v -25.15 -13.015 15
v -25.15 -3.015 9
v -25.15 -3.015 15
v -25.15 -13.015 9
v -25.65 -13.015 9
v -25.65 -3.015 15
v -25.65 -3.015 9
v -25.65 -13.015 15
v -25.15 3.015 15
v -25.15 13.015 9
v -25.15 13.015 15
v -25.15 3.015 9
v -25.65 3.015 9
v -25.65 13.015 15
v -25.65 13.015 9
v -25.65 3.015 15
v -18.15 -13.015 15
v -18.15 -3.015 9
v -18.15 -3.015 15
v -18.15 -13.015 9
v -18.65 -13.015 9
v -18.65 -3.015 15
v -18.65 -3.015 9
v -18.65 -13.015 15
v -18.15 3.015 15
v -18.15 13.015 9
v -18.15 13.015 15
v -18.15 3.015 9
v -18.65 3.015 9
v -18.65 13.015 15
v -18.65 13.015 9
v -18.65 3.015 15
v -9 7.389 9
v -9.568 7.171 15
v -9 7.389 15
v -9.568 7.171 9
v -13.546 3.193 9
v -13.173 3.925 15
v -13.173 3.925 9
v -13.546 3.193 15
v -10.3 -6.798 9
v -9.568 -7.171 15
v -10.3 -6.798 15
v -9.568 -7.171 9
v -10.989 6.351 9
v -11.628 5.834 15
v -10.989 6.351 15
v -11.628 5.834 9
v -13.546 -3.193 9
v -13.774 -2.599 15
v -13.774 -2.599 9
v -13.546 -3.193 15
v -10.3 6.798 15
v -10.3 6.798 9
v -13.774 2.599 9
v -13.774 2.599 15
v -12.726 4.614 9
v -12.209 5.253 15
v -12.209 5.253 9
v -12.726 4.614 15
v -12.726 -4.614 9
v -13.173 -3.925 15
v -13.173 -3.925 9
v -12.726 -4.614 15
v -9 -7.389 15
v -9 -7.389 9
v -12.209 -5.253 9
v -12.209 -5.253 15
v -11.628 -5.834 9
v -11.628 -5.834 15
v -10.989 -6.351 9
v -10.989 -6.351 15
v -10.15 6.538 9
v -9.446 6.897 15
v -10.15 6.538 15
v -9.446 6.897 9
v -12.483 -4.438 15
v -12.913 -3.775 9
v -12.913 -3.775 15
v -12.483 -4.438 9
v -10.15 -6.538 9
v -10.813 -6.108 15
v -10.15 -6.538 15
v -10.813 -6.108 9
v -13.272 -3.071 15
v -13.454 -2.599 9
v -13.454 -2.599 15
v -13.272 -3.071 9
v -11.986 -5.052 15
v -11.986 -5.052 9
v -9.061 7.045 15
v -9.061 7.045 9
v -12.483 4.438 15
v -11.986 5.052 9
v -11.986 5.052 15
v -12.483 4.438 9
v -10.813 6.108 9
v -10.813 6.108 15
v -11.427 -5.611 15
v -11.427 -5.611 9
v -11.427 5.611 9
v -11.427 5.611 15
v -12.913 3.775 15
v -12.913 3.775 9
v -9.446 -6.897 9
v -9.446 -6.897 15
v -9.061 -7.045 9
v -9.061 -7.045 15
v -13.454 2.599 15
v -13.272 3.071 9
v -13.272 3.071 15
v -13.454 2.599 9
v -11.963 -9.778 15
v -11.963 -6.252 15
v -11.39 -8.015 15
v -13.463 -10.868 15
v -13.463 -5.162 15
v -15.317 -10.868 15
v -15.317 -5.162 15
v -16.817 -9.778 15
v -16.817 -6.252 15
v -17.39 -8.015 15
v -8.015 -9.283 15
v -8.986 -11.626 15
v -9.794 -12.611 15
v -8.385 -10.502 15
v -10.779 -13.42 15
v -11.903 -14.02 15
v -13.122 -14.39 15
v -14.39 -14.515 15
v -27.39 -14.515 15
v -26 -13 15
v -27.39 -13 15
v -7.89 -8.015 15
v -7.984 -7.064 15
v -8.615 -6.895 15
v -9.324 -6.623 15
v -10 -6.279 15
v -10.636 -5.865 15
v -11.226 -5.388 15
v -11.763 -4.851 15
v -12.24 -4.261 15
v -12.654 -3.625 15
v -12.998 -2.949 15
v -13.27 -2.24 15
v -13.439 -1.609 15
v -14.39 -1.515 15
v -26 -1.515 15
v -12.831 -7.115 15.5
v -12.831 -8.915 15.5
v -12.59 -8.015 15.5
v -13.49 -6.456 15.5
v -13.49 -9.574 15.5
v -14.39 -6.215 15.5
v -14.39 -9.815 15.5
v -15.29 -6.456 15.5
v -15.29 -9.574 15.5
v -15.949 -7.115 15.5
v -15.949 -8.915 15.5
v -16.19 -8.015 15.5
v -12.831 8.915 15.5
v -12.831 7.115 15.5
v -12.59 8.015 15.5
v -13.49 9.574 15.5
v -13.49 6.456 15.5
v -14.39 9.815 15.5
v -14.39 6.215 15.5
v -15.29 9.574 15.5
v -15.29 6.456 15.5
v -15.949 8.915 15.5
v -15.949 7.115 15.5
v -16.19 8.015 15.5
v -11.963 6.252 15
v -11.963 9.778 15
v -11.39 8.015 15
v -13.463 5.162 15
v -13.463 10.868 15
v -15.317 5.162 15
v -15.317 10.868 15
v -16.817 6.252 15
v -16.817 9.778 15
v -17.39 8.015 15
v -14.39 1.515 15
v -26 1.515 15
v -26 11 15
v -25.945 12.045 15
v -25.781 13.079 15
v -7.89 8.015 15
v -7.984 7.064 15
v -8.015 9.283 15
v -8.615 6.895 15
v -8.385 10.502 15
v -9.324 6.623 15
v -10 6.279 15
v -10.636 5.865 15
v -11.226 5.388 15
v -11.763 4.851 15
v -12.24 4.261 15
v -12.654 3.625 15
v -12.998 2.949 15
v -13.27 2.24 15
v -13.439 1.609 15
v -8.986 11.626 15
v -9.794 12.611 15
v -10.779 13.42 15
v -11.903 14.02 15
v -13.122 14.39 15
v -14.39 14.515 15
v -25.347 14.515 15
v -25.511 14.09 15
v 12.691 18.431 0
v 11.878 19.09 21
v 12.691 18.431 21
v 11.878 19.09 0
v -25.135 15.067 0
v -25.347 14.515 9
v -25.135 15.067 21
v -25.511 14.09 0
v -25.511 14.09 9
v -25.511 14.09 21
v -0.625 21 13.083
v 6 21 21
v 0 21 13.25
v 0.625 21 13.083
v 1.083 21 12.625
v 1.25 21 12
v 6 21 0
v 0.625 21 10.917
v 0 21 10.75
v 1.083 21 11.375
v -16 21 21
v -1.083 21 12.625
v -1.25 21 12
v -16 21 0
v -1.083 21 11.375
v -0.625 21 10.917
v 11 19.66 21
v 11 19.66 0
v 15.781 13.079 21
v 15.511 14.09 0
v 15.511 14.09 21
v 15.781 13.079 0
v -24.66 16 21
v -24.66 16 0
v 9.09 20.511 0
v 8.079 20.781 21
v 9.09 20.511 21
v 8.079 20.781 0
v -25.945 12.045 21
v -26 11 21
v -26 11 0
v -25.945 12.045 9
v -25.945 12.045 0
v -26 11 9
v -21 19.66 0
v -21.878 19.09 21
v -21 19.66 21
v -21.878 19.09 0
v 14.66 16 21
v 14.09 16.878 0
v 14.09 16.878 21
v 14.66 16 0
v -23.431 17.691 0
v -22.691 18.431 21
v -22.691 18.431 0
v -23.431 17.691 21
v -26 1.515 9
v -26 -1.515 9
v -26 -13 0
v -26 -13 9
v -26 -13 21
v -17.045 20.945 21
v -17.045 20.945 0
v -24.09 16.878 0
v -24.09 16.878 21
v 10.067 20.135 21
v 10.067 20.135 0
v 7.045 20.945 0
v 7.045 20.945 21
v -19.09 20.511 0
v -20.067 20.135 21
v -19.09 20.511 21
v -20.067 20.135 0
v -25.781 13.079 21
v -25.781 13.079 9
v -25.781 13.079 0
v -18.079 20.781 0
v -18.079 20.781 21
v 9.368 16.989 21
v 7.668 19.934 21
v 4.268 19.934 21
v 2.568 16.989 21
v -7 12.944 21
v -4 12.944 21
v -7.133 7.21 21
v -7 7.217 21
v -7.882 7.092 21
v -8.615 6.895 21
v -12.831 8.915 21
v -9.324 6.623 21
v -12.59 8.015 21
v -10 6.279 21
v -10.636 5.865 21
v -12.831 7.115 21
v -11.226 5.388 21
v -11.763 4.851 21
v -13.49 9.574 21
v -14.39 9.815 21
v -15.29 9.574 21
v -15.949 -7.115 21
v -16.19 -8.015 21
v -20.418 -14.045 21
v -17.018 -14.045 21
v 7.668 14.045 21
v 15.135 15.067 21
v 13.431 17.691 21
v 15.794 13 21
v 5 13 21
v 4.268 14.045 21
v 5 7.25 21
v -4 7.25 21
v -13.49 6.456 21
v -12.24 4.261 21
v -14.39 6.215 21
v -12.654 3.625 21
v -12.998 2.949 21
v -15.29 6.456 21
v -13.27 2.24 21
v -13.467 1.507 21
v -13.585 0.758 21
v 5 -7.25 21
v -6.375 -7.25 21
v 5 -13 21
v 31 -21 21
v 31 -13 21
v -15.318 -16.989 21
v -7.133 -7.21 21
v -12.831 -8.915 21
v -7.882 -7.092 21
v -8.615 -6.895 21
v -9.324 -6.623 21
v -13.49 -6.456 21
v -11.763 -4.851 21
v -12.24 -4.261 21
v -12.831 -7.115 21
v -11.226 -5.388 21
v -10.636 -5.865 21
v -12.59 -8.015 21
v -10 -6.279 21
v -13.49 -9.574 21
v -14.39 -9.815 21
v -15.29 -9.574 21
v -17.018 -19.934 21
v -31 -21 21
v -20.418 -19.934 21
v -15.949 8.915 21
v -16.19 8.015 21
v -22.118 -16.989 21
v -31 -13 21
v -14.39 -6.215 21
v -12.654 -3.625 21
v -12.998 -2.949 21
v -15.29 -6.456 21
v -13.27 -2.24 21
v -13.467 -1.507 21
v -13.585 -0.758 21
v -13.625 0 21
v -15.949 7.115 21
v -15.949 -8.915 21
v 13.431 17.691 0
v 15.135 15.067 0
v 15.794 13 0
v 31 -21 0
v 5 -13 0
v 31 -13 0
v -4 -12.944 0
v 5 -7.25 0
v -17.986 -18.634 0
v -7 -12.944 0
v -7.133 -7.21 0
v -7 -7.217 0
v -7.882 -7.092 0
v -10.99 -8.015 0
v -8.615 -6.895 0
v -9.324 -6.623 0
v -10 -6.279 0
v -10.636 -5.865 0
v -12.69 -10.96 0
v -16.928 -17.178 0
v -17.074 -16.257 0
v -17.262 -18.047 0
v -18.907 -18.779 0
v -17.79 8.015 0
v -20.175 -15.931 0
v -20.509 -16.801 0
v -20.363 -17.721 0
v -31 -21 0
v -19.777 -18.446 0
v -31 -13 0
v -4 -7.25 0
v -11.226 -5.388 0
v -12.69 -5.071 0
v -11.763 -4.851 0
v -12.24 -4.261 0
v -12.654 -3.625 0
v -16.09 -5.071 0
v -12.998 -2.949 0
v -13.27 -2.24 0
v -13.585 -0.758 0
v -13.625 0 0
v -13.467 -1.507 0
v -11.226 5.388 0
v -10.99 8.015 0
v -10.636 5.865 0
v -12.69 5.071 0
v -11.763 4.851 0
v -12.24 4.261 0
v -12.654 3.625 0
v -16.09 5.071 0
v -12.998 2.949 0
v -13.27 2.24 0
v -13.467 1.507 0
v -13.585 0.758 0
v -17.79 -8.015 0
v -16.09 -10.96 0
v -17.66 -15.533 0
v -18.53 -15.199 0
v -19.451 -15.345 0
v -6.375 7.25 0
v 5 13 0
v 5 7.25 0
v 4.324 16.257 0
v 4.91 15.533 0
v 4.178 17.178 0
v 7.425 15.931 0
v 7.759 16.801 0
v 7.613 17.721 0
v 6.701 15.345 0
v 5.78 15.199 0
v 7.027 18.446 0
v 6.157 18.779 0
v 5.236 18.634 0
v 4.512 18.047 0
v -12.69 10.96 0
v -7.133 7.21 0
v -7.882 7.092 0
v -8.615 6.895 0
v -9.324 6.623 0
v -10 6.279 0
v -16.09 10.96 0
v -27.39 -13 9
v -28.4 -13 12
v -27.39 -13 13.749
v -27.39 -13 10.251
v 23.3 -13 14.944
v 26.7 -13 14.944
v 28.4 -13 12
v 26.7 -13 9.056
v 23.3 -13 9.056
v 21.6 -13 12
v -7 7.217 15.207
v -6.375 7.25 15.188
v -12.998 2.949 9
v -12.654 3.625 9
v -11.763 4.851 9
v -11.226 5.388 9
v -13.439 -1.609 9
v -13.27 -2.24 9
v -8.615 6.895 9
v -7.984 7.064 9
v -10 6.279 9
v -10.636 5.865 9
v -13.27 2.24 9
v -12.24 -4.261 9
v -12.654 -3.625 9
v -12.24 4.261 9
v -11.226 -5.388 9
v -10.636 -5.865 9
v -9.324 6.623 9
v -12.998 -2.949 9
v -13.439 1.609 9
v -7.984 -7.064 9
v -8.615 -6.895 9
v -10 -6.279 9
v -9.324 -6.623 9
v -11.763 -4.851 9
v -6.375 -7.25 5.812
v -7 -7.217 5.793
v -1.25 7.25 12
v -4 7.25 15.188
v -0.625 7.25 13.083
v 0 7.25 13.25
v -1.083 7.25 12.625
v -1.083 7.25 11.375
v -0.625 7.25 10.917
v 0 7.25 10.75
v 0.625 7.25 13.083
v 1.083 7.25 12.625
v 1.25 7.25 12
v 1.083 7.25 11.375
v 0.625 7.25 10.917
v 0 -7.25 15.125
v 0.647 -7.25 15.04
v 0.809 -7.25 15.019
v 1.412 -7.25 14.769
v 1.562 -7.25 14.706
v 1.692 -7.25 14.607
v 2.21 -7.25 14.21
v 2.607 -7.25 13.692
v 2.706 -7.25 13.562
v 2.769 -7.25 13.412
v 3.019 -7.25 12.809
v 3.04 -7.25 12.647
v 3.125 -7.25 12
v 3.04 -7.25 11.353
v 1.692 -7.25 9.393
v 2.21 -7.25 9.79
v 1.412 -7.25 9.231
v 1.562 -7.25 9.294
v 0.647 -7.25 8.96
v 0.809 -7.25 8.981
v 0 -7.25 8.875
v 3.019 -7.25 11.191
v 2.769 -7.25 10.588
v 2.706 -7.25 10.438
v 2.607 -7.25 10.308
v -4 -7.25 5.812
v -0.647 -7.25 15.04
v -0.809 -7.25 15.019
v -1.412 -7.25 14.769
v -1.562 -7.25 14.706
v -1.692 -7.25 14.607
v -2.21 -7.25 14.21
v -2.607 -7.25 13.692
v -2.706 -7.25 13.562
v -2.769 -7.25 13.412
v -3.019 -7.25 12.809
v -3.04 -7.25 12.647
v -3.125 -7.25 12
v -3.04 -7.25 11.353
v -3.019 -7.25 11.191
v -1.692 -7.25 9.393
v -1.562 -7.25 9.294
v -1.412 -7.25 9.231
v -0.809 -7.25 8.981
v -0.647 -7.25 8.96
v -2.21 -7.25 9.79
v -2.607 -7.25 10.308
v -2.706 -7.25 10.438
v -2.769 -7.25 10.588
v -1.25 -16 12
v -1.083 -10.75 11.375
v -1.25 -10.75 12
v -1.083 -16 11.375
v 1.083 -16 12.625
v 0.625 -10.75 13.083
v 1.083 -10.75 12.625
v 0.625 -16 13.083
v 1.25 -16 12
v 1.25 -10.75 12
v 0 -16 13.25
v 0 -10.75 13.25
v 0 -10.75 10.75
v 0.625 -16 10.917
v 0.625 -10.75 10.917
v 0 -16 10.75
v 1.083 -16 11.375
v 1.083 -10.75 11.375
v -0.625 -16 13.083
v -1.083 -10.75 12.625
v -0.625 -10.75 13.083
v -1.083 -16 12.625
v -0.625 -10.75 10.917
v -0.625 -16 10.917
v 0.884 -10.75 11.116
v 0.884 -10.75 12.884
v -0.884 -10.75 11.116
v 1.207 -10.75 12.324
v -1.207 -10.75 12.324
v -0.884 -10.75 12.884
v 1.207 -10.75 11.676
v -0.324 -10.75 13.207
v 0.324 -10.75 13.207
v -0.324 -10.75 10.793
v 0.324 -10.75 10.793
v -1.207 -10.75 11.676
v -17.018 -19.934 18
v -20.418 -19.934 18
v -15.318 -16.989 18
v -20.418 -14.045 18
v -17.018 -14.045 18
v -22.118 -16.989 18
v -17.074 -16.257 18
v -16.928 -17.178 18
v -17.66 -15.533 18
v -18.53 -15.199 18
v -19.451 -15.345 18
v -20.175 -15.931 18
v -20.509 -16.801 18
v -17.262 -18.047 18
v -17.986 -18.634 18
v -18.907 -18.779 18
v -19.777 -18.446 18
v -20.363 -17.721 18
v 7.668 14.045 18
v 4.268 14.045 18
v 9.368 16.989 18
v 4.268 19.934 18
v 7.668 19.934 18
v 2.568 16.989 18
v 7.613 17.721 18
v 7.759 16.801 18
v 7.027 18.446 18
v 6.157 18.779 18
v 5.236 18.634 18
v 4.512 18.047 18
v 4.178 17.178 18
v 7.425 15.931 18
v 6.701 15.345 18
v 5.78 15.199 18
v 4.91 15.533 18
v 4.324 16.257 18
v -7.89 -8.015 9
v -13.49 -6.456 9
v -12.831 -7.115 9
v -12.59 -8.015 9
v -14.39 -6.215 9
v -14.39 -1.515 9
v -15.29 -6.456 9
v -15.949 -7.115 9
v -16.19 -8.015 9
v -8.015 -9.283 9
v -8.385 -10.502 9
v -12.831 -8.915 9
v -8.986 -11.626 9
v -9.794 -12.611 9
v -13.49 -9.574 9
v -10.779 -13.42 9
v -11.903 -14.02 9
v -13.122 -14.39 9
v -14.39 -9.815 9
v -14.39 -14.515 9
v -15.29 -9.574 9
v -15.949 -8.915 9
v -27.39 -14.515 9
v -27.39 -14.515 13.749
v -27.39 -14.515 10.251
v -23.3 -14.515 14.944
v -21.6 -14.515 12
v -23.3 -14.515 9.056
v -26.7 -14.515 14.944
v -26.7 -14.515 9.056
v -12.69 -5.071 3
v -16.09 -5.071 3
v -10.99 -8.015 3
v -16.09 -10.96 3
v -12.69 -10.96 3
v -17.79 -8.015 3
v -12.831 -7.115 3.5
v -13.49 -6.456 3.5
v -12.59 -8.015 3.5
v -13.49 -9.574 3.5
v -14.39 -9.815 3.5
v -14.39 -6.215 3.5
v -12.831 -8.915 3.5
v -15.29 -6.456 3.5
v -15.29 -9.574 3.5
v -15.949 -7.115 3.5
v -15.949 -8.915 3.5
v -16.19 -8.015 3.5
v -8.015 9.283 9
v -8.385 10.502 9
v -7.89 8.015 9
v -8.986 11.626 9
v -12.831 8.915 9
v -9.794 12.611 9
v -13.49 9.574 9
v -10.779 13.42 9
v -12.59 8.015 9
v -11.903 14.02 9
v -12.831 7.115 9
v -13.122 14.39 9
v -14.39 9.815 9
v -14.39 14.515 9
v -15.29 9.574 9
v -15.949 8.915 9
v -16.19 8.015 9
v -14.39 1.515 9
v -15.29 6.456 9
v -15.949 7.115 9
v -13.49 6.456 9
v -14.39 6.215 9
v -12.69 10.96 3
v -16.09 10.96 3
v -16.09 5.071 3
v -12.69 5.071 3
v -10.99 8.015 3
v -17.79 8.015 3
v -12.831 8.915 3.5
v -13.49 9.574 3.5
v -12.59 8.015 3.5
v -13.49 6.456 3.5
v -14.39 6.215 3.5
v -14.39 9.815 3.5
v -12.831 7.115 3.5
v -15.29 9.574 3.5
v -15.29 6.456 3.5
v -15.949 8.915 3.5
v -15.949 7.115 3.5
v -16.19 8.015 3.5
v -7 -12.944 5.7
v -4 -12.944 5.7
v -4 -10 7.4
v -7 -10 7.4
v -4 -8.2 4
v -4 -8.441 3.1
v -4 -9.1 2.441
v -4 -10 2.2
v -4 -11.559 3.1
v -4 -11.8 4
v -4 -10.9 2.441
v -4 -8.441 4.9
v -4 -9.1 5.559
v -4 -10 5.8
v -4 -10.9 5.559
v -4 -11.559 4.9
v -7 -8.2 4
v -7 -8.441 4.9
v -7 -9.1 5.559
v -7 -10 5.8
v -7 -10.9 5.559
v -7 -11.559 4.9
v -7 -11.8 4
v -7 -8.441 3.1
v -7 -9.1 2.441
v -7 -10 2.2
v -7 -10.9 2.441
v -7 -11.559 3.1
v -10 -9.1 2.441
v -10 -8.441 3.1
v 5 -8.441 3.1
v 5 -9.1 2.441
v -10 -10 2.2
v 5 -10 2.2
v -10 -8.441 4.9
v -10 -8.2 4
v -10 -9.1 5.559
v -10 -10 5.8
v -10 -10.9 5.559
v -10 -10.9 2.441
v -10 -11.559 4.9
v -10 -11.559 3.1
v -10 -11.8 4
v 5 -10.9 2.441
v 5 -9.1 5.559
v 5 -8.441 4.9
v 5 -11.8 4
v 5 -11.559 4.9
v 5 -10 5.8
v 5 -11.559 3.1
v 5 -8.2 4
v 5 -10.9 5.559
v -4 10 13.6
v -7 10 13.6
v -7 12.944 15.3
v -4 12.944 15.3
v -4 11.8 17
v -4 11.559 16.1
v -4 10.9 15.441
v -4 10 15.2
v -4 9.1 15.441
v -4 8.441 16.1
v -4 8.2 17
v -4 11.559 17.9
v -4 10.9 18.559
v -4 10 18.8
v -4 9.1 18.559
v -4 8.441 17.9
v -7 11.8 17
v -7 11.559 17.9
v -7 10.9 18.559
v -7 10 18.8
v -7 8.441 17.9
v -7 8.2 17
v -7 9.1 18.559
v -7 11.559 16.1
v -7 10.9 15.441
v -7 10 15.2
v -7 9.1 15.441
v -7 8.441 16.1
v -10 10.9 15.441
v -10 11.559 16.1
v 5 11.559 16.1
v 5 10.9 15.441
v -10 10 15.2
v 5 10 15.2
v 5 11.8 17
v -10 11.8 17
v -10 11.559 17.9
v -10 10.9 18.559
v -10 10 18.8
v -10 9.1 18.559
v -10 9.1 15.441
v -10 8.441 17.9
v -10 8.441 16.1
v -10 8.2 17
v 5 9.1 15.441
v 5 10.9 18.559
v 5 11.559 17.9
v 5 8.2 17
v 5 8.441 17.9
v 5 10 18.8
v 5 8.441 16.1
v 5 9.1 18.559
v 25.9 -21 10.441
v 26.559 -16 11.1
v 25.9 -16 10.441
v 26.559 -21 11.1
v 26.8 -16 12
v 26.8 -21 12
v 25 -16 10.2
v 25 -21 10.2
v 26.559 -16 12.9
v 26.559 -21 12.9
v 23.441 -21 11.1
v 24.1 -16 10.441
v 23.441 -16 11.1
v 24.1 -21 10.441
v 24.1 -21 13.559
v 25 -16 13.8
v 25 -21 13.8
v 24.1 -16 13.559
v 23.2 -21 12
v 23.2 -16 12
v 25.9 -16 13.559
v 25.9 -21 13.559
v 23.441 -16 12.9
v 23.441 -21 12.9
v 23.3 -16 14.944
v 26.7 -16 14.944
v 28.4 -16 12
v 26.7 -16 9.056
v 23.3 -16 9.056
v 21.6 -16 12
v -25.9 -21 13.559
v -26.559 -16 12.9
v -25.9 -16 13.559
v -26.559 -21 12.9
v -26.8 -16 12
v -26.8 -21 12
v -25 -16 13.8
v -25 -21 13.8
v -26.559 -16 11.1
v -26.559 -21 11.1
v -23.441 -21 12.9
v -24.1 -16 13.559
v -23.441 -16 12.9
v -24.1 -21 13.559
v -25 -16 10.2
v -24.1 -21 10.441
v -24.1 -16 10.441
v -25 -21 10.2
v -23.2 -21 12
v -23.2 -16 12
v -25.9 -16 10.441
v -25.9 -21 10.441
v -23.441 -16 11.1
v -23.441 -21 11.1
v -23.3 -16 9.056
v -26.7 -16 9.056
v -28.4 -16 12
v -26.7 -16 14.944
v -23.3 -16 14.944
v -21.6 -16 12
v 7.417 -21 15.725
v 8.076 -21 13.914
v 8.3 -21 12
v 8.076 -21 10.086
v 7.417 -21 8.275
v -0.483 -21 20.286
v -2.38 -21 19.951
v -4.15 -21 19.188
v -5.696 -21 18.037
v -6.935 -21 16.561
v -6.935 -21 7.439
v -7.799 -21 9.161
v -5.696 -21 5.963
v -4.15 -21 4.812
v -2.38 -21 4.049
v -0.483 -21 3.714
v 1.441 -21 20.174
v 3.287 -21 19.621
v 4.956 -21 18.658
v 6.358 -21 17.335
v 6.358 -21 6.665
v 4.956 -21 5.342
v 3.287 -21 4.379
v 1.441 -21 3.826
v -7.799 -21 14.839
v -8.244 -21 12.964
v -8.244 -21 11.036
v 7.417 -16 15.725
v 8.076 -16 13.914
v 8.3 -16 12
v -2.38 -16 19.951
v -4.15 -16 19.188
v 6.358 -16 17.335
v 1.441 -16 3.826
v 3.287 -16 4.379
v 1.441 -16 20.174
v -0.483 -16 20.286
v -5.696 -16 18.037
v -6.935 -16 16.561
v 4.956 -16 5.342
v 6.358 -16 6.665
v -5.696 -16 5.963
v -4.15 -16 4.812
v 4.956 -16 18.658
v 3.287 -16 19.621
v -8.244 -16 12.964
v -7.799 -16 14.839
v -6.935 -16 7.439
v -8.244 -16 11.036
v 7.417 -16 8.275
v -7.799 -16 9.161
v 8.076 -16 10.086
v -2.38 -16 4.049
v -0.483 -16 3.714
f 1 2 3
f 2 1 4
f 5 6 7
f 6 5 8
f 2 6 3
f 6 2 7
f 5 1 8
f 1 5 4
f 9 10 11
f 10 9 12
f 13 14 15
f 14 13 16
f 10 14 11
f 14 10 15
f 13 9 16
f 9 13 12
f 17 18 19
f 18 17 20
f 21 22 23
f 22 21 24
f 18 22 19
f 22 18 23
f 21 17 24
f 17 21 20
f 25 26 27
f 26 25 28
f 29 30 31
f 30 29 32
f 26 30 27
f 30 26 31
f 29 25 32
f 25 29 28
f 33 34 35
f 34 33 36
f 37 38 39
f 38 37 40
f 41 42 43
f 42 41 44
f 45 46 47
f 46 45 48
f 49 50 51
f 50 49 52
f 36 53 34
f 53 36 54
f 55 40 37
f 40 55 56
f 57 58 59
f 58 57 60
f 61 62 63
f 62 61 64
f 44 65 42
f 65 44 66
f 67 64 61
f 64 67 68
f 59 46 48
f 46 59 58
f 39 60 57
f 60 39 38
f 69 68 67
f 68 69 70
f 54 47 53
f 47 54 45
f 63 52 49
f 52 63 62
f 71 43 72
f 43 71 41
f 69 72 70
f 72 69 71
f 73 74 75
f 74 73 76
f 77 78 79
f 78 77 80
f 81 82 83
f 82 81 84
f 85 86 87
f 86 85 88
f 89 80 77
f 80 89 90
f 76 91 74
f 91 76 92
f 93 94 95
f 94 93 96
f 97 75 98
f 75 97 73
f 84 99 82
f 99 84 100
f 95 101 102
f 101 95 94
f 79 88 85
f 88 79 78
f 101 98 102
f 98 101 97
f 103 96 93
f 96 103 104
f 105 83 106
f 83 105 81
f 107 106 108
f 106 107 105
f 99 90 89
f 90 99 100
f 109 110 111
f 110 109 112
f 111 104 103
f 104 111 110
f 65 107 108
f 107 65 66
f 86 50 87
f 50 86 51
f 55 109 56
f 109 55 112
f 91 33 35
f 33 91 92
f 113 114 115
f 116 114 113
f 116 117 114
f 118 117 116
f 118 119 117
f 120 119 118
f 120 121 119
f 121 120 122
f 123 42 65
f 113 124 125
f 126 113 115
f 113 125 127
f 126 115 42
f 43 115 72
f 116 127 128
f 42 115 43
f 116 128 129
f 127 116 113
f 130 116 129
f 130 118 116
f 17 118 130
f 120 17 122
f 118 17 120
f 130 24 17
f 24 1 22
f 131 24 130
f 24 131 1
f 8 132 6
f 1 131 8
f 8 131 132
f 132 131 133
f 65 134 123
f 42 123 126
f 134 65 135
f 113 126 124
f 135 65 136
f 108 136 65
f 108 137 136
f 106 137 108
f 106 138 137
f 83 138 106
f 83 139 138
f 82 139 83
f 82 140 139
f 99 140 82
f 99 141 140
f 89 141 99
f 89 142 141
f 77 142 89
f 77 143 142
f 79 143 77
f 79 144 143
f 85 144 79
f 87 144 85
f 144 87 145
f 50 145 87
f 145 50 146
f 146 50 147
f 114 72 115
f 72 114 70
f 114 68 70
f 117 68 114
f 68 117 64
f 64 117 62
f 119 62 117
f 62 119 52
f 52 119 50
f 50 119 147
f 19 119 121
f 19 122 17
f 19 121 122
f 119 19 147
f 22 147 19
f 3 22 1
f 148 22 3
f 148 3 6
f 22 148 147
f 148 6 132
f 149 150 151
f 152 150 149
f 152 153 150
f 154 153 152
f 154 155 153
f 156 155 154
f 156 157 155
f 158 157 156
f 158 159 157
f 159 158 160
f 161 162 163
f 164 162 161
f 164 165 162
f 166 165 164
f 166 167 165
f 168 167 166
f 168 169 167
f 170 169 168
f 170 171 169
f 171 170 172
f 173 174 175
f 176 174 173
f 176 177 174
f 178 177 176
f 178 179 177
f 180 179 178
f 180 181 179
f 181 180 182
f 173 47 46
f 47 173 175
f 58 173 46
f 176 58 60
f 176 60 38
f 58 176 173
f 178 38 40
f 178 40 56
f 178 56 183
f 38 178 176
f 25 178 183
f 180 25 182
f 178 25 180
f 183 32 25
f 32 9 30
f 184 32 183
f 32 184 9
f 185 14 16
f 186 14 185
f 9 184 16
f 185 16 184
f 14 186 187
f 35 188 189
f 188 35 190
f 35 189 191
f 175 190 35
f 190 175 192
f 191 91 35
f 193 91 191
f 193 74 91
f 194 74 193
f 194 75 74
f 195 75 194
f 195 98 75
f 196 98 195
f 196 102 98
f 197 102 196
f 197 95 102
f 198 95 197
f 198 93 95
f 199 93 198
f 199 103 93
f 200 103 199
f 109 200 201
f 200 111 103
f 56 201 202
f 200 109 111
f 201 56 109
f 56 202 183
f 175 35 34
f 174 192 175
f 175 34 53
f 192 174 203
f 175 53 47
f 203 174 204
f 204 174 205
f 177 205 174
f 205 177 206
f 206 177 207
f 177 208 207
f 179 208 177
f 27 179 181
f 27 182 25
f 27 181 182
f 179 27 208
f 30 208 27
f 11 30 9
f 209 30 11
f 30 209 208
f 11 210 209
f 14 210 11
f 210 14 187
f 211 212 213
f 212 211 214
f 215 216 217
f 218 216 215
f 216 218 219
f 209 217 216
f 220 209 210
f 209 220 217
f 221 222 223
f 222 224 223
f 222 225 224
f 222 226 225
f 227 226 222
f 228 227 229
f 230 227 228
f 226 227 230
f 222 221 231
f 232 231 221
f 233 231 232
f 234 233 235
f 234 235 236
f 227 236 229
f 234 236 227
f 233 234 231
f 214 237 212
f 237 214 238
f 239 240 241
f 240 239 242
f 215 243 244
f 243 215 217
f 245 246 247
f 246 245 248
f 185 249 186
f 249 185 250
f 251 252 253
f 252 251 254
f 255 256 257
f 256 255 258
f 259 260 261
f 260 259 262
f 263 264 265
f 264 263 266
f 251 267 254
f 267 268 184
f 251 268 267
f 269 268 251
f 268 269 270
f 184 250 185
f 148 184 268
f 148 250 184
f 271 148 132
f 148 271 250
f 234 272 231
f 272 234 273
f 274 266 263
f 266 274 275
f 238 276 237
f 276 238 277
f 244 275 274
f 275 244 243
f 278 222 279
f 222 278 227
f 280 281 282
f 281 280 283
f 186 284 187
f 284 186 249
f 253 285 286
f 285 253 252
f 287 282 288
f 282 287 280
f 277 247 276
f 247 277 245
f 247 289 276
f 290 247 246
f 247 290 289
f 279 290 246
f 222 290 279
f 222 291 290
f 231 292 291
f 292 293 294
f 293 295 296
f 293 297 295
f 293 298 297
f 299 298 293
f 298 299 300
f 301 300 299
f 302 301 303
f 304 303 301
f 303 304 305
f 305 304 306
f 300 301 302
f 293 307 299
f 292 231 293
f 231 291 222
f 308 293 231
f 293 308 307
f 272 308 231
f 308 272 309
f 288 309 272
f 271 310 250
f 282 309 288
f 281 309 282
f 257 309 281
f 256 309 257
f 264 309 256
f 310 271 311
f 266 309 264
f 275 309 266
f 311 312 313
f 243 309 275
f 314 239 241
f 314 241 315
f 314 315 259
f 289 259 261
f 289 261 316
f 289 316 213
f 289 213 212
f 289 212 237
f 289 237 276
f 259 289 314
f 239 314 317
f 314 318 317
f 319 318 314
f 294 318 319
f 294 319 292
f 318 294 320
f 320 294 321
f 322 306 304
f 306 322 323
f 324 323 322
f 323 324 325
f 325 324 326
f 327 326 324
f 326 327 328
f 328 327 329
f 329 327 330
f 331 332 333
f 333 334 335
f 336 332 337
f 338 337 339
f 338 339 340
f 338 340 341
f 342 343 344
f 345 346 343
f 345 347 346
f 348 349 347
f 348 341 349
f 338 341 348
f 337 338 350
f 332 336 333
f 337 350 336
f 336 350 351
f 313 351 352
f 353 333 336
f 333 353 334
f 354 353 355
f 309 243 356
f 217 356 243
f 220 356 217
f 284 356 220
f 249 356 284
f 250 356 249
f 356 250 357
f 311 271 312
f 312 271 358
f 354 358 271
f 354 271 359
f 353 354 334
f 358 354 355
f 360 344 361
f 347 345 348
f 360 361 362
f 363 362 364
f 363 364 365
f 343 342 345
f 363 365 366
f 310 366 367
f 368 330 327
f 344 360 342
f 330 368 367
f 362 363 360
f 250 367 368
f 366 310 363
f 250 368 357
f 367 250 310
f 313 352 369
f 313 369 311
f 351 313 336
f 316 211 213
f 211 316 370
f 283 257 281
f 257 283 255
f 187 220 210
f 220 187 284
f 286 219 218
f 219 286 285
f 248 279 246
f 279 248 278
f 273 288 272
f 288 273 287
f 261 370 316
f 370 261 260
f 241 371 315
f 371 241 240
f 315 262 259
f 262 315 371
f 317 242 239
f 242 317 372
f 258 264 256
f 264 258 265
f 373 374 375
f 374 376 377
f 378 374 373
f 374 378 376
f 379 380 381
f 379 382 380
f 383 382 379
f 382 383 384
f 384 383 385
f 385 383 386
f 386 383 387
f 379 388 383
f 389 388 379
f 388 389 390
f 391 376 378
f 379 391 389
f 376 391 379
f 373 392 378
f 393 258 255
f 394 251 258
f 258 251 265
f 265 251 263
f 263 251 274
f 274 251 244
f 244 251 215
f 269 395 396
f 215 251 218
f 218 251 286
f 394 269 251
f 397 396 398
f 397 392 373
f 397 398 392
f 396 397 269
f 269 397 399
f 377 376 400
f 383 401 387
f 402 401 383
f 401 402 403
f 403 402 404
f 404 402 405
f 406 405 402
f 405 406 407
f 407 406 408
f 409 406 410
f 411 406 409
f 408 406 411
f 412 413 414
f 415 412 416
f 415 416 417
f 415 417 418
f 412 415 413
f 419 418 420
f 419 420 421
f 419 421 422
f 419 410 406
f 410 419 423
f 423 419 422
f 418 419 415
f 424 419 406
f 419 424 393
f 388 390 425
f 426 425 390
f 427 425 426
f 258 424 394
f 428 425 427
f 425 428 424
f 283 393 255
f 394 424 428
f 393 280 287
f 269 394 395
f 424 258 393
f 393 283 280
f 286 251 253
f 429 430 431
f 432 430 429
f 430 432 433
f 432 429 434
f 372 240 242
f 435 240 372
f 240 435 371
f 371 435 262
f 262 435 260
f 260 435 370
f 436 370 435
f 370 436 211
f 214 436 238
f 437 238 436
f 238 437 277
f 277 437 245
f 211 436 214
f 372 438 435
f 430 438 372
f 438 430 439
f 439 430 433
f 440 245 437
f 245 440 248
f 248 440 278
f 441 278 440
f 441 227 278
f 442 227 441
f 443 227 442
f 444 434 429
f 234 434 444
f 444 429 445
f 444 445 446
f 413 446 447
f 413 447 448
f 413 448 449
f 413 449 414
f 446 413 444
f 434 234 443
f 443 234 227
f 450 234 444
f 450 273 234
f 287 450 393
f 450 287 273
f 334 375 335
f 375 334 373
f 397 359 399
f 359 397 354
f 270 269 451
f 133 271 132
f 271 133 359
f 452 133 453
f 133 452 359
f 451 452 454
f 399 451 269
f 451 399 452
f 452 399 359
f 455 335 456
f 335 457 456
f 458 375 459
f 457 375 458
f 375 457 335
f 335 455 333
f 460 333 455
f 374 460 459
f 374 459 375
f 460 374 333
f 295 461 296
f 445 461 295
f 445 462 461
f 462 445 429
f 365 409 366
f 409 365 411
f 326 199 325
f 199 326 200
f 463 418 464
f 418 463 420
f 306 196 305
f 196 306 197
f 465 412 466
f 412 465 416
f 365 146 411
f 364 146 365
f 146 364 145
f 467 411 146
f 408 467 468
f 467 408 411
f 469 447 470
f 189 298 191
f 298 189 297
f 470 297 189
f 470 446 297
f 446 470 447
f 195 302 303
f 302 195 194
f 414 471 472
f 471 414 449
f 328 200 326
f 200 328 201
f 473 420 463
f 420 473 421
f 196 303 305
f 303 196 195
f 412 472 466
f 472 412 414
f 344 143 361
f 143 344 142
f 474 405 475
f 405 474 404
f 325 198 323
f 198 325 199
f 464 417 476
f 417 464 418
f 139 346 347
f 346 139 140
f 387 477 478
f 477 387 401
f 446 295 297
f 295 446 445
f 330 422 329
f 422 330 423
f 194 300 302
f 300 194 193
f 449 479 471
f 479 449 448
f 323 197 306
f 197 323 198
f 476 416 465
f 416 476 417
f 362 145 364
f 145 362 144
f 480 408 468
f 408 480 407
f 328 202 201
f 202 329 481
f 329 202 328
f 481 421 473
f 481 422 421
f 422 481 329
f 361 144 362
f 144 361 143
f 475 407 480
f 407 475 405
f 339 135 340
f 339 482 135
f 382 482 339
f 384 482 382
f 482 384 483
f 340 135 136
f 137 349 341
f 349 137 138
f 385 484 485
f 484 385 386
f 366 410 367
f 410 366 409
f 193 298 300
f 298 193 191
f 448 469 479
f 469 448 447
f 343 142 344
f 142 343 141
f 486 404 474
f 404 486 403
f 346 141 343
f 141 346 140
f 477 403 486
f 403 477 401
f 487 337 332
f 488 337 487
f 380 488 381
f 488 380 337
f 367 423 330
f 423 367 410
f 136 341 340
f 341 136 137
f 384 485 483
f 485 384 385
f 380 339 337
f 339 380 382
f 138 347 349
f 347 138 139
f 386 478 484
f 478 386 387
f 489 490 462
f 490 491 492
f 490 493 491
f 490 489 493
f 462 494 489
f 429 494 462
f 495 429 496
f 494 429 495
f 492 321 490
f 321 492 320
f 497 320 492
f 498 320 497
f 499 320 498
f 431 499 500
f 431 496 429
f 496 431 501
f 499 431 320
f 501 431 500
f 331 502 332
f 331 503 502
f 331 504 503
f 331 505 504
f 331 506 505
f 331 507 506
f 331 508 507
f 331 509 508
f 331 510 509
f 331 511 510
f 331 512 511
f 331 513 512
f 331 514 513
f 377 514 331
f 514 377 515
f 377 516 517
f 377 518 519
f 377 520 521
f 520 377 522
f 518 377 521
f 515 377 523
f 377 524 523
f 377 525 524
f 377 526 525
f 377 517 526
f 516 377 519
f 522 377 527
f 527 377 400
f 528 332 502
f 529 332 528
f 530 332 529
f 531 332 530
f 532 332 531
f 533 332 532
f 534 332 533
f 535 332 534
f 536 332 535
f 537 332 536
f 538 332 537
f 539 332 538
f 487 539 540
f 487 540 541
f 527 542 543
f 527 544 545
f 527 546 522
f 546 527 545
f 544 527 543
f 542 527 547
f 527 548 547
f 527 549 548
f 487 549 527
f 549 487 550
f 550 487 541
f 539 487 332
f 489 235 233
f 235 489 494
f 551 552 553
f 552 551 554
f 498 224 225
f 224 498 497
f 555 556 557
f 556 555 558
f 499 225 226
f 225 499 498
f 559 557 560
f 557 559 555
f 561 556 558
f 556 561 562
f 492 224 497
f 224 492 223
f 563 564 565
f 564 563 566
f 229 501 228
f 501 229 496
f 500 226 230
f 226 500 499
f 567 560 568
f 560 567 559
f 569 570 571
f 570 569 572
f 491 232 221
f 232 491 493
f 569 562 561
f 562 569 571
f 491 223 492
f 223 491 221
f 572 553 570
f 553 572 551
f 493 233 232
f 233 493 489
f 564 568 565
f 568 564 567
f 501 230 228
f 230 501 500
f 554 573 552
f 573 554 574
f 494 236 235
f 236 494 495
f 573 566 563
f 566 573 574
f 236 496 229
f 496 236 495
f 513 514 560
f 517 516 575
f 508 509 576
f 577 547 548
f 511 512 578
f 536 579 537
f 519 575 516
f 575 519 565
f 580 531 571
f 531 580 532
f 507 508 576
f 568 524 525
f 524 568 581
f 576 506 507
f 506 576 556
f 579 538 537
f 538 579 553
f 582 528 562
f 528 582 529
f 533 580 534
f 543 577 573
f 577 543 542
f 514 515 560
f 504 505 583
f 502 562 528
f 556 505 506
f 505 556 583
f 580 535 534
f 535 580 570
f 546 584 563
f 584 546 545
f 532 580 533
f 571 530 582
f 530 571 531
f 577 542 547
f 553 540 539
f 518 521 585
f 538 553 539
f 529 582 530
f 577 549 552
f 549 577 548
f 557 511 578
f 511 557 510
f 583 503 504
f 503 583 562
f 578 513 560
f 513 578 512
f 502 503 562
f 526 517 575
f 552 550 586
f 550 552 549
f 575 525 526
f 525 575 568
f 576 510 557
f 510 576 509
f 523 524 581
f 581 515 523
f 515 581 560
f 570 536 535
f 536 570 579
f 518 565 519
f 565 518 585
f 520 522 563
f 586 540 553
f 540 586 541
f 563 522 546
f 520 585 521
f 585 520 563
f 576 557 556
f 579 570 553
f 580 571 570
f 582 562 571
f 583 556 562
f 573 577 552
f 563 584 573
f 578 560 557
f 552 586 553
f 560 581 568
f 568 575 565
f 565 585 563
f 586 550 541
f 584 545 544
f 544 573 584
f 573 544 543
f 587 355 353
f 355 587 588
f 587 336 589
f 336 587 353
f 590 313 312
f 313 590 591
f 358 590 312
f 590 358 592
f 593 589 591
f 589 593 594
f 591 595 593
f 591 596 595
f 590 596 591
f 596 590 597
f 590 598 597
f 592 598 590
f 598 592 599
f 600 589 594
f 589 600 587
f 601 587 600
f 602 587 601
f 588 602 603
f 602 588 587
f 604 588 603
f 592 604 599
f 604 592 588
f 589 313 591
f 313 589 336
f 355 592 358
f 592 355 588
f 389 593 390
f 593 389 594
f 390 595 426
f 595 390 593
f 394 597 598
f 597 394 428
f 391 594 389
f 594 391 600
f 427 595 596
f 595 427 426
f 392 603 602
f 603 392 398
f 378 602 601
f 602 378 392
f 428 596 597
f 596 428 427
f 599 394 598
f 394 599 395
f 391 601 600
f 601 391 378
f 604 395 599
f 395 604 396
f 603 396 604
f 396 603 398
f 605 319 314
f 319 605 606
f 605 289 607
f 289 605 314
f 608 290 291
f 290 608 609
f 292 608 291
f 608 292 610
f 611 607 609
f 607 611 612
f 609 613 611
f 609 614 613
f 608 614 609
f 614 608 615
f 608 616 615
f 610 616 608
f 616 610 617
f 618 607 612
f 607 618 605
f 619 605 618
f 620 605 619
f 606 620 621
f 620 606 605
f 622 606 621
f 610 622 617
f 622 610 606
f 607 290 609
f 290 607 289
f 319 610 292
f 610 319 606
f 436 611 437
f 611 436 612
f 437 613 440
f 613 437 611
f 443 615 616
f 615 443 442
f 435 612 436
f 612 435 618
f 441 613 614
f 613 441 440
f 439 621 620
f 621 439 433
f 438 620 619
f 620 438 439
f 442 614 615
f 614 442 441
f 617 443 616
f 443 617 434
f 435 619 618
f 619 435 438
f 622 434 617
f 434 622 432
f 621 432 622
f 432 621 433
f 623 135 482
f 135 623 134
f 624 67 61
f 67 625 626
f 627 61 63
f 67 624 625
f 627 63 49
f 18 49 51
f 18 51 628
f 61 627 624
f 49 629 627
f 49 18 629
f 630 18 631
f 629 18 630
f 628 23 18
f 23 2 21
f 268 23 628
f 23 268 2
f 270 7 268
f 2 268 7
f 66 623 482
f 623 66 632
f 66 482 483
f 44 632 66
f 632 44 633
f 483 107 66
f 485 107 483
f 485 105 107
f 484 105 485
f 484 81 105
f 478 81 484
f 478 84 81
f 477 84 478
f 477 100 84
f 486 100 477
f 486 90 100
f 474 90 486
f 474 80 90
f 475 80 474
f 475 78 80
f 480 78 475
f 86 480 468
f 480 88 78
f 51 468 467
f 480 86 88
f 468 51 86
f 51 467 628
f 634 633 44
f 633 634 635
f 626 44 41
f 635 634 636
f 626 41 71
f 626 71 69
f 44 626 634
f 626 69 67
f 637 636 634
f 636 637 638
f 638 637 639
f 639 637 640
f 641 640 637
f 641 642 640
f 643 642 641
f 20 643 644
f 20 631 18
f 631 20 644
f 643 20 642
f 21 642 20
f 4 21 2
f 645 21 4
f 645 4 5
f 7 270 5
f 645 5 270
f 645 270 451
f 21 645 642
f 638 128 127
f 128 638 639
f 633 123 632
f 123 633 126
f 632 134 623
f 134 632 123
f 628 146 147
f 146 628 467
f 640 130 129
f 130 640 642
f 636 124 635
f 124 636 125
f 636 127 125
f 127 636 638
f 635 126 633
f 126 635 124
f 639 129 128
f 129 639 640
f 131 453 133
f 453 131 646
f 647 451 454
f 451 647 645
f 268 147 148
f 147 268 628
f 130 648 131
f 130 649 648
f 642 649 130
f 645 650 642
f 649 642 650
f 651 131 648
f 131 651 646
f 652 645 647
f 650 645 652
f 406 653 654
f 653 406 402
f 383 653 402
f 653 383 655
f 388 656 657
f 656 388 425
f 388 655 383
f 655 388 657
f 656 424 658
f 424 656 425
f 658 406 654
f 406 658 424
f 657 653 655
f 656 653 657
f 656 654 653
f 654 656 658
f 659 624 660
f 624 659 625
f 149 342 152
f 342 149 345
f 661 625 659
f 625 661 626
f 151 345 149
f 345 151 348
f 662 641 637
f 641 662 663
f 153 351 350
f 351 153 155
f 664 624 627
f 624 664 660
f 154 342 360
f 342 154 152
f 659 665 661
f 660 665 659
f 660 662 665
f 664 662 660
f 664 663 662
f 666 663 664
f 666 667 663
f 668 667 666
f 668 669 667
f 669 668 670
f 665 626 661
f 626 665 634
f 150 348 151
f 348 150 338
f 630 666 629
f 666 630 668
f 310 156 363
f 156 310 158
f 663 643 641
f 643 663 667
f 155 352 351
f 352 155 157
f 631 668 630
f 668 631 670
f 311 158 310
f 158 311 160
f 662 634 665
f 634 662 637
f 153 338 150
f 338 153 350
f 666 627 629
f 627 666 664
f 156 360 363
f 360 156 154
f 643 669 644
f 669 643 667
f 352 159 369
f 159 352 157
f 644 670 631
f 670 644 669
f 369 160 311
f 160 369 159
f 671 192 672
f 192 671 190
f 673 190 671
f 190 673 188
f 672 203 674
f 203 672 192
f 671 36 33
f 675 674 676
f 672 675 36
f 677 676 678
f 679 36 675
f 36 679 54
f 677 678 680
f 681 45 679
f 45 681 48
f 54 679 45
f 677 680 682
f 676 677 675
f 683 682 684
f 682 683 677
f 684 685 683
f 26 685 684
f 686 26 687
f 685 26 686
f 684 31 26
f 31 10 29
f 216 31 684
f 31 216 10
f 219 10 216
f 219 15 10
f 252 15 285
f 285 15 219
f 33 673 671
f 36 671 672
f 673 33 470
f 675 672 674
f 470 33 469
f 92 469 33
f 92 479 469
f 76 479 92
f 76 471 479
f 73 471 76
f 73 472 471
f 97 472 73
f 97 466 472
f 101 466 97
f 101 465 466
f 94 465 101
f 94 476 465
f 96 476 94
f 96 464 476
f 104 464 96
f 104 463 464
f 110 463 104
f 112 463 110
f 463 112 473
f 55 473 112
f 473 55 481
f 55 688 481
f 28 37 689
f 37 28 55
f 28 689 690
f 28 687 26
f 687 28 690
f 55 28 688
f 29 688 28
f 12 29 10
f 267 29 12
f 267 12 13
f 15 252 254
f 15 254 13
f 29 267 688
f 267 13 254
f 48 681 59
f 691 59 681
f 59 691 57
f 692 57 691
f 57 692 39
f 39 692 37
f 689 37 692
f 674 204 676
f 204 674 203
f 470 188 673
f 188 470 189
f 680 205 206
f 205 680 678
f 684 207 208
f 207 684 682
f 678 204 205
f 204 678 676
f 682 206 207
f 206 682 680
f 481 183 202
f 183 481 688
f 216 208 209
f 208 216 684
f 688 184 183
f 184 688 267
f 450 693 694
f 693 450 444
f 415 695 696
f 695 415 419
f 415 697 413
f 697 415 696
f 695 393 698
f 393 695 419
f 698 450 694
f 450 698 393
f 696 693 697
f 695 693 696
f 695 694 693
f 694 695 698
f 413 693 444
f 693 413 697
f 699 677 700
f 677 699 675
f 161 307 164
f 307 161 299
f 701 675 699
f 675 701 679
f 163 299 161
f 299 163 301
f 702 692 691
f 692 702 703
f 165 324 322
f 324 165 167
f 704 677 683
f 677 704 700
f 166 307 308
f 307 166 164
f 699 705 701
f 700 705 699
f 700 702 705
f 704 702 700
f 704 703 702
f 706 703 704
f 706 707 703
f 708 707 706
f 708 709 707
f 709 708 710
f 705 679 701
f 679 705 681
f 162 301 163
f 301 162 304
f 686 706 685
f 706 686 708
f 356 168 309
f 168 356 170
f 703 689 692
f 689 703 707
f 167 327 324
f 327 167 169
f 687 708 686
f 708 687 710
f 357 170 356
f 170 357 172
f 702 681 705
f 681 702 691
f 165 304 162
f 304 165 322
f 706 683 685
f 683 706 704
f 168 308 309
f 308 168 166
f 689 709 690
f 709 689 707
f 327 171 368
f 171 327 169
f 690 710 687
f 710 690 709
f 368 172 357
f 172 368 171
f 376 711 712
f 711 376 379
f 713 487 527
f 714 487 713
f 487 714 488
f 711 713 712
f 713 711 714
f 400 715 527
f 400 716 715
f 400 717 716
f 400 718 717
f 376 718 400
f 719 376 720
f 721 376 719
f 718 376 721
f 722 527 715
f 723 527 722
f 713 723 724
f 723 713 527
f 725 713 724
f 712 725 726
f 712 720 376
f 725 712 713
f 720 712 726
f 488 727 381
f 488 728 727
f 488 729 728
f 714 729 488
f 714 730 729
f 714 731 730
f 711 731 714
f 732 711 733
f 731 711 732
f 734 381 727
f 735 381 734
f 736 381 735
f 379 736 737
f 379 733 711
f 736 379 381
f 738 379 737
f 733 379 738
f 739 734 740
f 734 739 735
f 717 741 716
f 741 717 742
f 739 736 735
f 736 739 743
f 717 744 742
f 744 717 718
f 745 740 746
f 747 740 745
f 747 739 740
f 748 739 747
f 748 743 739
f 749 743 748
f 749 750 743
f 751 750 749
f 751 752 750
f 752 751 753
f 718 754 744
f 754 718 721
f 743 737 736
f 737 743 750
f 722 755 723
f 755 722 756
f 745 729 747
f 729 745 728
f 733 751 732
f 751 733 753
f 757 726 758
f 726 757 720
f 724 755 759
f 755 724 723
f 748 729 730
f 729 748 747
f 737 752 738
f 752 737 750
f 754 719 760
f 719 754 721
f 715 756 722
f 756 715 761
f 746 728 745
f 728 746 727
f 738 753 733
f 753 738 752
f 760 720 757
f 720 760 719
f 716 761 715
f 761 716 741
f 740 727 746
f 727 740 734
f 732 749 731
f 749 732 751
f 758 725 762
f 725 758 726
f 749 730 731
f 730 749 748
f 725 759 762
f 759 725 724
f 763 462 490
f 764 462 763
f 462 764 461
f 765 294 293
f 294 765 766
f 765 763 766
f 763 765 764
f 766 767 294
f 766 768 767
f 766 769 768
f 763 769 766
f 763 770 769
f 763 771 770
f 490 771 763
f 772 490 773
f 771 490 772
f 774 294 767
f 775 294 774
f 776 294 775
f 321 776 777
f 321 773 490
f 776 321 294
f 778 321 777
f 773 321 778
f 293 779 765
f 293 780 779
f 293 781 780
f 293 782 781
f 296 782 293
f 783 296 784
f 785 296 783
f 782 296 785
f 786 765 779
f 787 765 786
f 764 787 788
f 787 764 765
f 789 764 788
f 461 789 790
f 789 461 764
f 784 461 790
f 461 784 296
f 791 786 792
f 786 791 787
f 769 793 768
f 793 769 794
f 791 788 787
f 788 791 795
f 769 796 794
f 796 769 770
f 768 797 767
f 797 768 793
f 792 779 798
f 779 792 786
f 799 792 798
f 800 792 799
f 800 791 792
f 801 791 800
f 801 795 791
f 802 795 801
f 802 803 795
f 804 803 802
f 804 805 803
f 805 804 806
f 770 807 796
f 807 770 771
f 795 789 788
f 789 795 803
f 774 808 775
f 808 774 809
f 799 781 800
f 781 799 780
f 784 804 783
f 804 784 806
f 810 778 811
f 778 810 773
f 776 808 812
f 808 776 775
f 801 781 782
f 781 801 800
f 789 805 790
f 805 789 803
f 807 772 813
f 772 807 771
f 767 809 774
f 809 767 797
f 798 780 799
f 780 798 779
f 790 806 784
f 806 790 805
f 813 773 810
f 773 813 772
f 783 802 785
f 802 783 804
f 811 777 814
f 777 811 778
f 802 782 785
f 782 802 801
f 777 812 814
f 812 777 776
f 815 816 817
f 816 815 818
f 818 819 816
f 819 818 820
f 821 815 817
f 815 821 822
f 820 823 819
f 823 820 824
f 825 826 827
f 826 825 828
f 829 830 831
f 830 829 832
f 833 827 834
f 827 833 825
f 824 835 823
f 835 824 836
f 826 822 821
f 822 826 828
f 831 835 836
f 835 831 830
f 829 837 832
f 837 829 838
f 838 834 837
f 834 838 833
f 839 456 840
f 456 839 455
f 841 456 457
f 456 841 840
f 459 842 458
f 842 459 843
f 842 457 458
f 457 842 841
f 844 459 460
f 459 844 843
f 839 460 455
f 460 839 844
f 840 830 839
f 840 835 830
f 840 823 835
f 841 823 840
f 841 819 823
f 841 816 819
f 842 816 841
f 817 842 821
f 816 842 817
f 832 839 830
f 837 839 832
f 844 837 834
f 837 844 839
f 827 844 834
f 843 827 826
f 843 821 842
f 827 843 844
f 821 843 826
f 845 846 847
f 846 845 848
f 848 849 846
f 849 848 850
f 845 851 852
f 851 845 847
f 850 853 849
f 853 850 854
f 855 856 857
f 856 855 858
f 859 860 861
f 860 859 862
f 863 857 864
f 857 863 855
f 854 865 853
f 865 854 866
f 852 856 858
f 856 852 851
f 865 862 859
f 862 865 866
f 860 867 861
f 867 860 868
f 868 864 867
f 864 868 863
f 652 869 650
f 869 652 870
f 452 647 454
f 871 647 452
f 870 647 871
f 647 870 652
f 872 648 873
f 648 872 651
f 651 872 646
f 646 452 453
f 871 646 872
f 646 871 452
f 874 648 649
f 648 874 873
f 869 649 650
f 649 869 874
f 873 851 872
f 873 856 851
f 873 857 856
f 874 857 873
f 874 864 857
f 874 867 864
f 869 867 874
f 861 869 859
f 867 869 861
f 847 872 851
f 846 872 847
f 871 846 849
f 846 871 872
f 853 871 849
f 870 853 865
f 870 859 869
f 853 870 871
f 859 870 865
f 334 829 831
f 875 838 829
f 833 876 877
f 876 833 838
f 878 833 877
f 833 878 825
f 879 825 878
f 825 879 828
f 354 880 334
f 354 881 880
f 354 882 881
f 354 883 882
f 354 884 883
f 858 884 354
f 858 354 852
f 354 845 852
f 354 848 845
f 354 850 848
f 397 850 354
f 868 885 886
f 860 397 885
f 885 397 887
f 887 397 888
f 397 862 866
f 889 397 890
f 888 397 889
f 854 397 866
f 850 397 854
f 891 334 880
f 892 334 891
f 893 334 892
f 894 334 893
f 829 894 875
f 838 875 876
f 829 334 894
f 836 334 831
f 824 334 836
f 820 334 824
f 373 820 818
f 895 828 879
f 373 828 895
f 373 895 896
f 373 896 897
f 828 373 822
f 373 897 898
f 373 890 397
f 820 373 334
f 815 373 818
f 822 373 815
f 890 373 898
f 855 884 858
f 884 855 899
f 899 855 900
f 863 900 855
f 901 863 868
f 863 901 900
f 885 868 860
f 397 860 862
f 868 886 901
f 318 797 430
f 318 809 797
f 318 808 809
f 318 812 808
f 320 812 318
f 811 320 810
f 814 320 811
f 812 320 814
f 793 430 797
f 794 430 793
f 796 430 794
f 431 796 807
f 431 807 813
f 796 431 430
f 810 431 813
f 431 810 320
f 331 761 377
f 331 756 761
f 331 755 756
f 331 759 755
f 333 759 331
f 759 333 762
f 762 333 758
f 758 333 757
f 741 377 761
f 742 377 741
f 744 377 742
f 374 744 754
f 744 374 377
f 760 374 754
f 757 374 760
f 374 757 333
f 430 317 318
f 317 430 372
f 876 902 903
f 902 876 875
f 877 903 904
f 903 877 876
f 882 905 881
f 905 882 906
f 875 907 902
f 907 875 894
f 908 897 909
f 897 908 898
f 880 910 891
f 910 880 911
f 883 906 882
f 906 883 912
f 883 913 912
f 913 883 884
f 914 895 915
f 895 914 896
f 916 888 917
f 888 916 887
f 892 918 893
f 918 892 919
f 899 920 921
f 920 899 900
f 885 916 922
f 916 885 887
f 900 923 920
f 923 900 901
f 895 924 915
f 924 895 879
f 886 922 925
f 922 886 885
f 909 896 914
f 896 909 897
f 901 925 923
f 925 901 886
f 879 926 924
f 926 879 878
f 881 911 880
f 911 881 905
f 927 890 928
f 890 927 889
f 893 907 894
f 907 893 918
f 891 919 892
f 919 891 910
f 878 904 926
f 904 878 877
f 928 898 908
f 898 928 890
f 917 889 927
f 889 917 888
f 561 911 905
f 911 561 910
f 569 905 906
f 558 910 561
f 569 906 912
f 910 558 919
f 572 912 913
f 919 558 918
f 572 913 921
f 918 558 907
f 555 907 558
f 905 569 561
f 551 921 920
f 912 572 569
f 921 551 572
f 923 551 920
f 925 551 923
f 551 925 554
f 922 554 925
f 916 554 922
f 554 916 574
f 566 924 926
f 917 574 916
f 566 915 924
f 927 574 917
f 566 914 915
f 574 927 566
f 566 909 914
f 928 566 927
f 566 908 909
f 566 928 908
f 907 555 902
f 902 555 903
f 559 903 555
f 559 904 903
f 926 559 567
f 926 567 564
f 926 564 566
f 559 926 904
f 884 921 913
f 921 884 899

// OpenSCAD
// Based on MendelMax J-Head Micro-Extruder V5 by Ultibots:
// http://www.thingiverse.com/thing:42112
//
// Completely rewritten in OpenSCAD by Johann on 2013-01-19.

bearing_id = 3; // 623zz bearings are 3x10x4mm.
bearing_od = 10;
bearing_width = 4;
bearing_offset = 1.5;

body_height = 42;
body_width = 42; // V5: 52mm.
body_offset = 5; // V5: 7mm.
body_thickness = 21;
body_roundness = 10;

groovemount_od = 16.6; // 16mm nominal.
groovemount_height = 5; // Must push down on GrooveMount.

filament_offset = 1.5;
filament_dia = 1.75; // This is for 1.75mm filament.
filament_hole_dia = 2.5; // Size of opening into and out of the extruder.
filament_squish = 0.0; // Distance the drive gear teeth press into the filament.

// Measured drive gear sizes, sample size of one each (brandonheller):
// Trinity Labs hobbed pulley: 12.66mm od, 11mm valley od
// TriDPrinting hobbed pulley: 12.68mm od, 10.56mm valley od
// Make sure to set these, to reduce friction from twisting the filament, as well as ensure that the drive gear bearings actually rest against the drive gear.
drive_gear_width = 12;
drive_gear_id = 5;
drive_gear_od = 12.67;
drive_gear_valley_od = 11; // Diameter of drive gear at the valley of the teeth.
drive_gear_offset = drive_gear_valley_od/2+filament_dia/2-filament_squish;  // Was: 7

cutout_id = 14.5;
cutout_height = 26;

funnel_depth = 7;
funnel_entrance_dia = 5;

foot_width = 62;
foot_offset = 0; // V5: 2mm but most GrooveMount plates are centered.

motor_mount_radius = 21;
motor_mount_angle = 54;

m3_radius = 1.8;
m3_nut_radius = 3.4;
m3_nut_height = 3;

m4_radius = 2.3;
m4_nut_radius = 4.5;
m4_nut_width = 7.5;
m4_nut_height = 4;

idler_x = -5.5;
idler_y = 10;
idler_z = 6.5;

// Place the two drive gear support bearings:
//  - tangent to the drive gear
//  - 90 degrees apart
//  - 45 degrees rotated up or down from bottom of extruder.
bearing_drive_gear_offset = drive_gear_od/2+bearing_od/2;
bearing_drive_gear_offset_x_y = bearing_drive_gear_offset*(sqrt(2)/2);
bearing_x = bearing_drive_gear_offset_x_y+drive_gear_offset; // Was: 15.5
bearing_y = bearing_drive_gear_offset_x_y; // Was: 7.5

module pg35l_extruder() {
  union() {
    // Single wall support surfaces, to be removed after printing.
    for (x = [-body_width/2, -body_width/3]) {
      for (y = [-bearing_y, bearing_y]) {
	translate([x-body_offset+0.6, y, bearing_offset])
	  cube([0.5, bearing_od, body_thickness*2/3], center=true);
      }
    }
    intersection() {
      translate([-drive_gear_offset, 0, 0]) difference() {
        cylinder(r=cutout_id/2+0.6, h=body_thickness-2, center=true, $fn=60);
        cylinder(r=cutout_id/2+0.3, h=body_thickness-1, center=true, $fn=60);
      }
      union() {
        for (y = [-bearing_y, bearing_y]) {
	  translate([-bearing_x, y, bearing_offset]) {
	    cylinder(r=bearing_od/2+0.5, h=body_thickness/2, center=true);
	    // Drive gear support bearings
	    % cylinder(r=bearing_od/2, h=bearing_width, center=true);
	  }
	}
      }
    }
    // Bridge M3 screw holes above bearing spaces.
    for (y = [-bearing_y, bearing_y]) {
      translate([-bearing_x, y, bearing_offset+bearing_width/2+1.25]) {
	cylinder(r=3, h=0.5, center=true);
      }
    }
    difference() {
      union() {
	// Rounded top.
	translate([-body_offset, -body_roundness, 0]) minkowski() {
	  cube([body_width-2*body_roundness, body_height, body_thickness-1],
	       center=true);
	  cylinder(r=body_roundness, h=1, center=true, $fn=60);
	}
	// Foot.
	translate([-foot_offset, -body_height/2, 0])
	  cube([foot_width, 16, body_thickness], center=true);
      }
      // Uncomment the following line to look inside.
      // translate([-30, 0, 16]) cube([60, 30, 30], center=true);
      // Flat bottom.
      translate([0, -body_height/2-20, 0])
	cube([2*body_width, 40, body_thickness+1], center=true);
      // Drive gear cutout.
      translate([-drive_gear_offset, 0, 0]) {
	cylinder(r=cutout_id/2, h=body_thickness+1, center=true, $fn=60);
	translate([20, 0, 0])
	  cube([40, cutout_id, body_thickness+1], center=true);
      }
      // Idler cutout.
      translate([25, 0, 0])
	cube([40, cutout_height, body_thickness+1], center=true);
      // Filament path and funnel.
      translate([0, 0, filament_offset]) rotate([90, 0, 0]) {
	// Filament cutout.
       cylinder(r=filament_hole_dia/2, h=2*body_height, center=true, $fn=12);
       // Filament funnel.
	translate([0, 0, cutout_id/2])
         cylinder(r1=funnel_entrance_dia, r2=filament_hole_dia/2, h=funnel_depth,
		   center=true, $fn=24);
      }
      // Motor mount screws.
      translate([-drive_gear_offset, 0, 0])
      for (x = [-motor_mount_radius, motor_mount_radius]) {
	rotate([0, 0, motor_mount_angle])
	  translate([x, 0, body_thickness/2-m3_nut_height]) {
	  rotate([0, 0, -motor_mount_angle])
	    cylinder(r=m3_nut_radius, h=m3_nut_height*2, $fn=6);
	  translate([0, 0, 0.5]) rotate([180, 0, 0])
	    cylinder(r=m3_radius, h=body_thickness, $fn=12);
	}
      }
      // Bearing spaces and mount screws.
      for (y = [-bearing_y, bearing_y]) {
	translate([-bearing_x, y, bearing_offset]) {
	  cylinder(r=(bearing_od+3)/2, h=bearing_width+2, center=true, $fn=32);
	  translate([-6.5, 0, 0])
	    cube([13, bearing_od+3, bearing_width+2], center=true);
	}
	translate([-bearing_x, y, m3_nut_height-body_thickness/2]) {
	  rotate([180, 0, 0])
	    cylinder(r=m3_nut_radius, h=m3_nut_height*2, $fn=6);
	  translate([0, 0, 0.5])
	    cylinder(r=m3_radius, h=body_thickness, $fn=12);
	}
      }
      // Idler screws.
      for (i = [-1, 1]) {
	translate([0, i*idler_y, i*idler_z]) rotate([0, 90, 0]) {
	  cylinder(r=m3_radius, h=20, center=true, $fn=12);
	  for (x = [0, -3*i])
	    translate([x, 0, idler_x])
	      cylinder(r=m3_nut_radius, h=m3_nut_height, center=true, $fn=6);
	}
      }
      // Foot mounting screws and nut pockets.
      translate([-foot_offset, 5-body_height/2, filament_offset])
      for (a = [0, 180]) {
	rotate([-90, a, 0]) translate([25, 0, 0]) {
	  cylinder(r=m3_radius, h=13, center=true, $fn=12);
	  cylinder(r=m3_nut_radius, h=7, $fn=6);
	}
      }
      // Groove mount.
      translate([0, -body_height/2, filament_offset]) rotate([90, 0, 0])
	cylinder(r=groovemount_od/2, h=2*groovemount_height, center=true);
    }
  }
  // Drive gear.
  % translate([-drive_gear_offset, 0, 0]) difference() {
    cylinder(r=drive_gear_od/2, h=drive_gear_width, center=true);
    cylinder(r=drive_gear_id/2, h=drive_gear_width+1, center=true, $fn=12);
  }
}

translate([0, 0, body_thickness/2]) pg35l_extruder();

// Uncomment the following line for reference.
// translate([2, -21, 0]) % import("me_body_v5.1_3mm.stl");
